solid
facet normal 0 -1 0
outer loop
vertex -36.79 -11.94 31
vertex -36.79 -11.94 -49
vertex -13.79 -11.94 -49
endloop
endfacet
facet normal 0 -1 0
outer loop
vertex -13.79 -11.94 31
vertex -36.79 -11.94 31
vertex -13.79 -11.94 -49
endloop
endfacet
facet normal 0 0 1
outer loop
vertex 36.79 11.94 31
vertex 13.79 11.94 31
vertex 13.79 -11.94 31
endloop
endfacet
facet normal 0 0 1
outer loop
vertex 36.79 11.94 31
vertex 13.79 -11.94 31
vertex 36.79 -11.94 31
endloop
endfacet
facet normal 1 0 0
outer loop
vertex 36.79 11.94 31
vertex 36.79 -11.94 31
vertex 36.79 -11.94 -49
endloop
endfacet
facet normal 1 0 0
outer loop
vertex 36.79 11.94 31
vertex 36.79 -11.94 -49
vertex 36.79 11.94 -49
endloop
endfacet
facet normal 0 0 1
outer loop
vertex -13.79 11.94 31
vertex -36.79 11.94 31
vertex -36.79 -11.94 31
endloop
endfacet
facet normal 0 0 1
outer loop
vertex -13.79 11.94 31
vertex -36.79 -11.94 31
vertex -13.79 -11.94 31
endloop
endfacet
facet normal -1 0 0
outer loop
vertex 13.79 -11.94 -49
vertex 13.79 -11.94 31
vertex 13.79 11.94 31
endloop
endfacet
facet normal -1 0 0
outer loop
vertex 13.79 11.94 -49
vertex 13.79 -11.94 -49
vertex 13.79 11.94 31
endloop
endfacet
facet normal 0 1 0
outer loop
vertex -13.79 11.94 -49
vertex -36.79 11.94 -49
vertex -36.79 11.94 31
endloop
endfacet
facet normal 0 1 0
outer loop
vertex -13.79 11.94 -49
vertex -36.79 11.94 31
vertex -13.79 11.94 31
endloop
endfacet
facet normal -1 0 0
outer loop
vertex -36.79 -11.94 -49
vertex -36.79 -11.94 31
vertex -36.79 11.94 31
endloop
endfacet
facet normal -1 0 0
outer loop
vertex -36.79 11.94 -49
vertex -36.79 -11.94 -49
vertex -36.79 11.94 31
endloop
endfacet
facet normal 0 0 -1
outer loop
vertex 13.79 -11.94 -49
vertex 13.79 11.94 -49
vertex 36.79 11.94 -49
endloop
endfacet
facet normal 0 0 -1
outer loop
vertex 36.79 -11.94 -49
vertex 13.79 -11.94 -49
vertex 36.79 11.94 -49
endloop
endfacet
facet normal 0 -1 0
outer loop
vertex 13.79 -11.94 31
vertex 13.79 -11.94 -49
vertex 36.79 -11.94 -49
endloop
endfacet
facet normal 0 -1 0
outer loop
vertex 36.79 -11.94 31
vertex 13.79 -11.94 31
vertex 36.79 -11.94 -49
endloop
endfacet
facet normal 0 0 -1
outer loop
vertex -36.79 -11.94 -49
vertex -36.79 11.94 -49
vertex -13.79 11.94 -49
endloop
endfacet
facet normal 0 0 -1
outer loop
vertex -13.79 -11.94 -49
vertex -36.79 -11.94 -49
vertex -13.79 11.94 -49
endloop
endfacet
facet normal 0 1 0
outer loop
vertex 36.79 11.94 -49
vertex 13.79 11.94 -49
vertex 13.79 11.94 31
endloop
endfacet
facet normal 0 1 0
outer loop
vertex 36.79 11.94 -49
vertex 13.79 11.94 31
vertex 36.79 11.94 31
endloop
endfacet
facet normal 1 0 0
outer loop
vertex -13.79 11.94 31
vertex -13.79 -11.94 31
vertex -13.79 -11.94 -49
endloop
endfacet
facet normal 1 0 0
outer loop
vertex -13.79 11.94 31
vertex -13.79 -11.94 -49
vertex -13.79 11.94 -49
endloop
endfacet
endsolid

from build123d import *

# Parameters (mm, degrees)
BOX013_W     = 23
BOX013_H     = 23.88
BOX013_DEPTH = 80
BOX012_W     = 23
BOX012_H     = 23.88
BOX012_DEPTH = 80


with BuildPart() as cork001:
    # Box013 → Box013 (new body)
    with BuildSketch(Plane(origin=(-36.79, -11.94, -49), x_dir=(1, 0, 0), z_dir=(0, 0, 1))):
        with Locations((11.5, 11.94)):
            Rectangle(BOX013_W, BOX013_H)
    extrude(amount=BOX013_DEPTH)


with BuildPart() as cork:
    # Box012 → Box012 (new body)
    with BuildSketch(Plane(origin=(13.79, -11.94, -49), x_dir=(1, 0, 0), z_dir=(0, 0, 1))):
        with Locations((11.5, 11.94)):
            Rectangle(BOX012_W, BOX012_H)
    extrude(amount=BOX012_DEPTH)

    # Fusion030: union Cork001
    add(cork001.part)


solid = cork.part
